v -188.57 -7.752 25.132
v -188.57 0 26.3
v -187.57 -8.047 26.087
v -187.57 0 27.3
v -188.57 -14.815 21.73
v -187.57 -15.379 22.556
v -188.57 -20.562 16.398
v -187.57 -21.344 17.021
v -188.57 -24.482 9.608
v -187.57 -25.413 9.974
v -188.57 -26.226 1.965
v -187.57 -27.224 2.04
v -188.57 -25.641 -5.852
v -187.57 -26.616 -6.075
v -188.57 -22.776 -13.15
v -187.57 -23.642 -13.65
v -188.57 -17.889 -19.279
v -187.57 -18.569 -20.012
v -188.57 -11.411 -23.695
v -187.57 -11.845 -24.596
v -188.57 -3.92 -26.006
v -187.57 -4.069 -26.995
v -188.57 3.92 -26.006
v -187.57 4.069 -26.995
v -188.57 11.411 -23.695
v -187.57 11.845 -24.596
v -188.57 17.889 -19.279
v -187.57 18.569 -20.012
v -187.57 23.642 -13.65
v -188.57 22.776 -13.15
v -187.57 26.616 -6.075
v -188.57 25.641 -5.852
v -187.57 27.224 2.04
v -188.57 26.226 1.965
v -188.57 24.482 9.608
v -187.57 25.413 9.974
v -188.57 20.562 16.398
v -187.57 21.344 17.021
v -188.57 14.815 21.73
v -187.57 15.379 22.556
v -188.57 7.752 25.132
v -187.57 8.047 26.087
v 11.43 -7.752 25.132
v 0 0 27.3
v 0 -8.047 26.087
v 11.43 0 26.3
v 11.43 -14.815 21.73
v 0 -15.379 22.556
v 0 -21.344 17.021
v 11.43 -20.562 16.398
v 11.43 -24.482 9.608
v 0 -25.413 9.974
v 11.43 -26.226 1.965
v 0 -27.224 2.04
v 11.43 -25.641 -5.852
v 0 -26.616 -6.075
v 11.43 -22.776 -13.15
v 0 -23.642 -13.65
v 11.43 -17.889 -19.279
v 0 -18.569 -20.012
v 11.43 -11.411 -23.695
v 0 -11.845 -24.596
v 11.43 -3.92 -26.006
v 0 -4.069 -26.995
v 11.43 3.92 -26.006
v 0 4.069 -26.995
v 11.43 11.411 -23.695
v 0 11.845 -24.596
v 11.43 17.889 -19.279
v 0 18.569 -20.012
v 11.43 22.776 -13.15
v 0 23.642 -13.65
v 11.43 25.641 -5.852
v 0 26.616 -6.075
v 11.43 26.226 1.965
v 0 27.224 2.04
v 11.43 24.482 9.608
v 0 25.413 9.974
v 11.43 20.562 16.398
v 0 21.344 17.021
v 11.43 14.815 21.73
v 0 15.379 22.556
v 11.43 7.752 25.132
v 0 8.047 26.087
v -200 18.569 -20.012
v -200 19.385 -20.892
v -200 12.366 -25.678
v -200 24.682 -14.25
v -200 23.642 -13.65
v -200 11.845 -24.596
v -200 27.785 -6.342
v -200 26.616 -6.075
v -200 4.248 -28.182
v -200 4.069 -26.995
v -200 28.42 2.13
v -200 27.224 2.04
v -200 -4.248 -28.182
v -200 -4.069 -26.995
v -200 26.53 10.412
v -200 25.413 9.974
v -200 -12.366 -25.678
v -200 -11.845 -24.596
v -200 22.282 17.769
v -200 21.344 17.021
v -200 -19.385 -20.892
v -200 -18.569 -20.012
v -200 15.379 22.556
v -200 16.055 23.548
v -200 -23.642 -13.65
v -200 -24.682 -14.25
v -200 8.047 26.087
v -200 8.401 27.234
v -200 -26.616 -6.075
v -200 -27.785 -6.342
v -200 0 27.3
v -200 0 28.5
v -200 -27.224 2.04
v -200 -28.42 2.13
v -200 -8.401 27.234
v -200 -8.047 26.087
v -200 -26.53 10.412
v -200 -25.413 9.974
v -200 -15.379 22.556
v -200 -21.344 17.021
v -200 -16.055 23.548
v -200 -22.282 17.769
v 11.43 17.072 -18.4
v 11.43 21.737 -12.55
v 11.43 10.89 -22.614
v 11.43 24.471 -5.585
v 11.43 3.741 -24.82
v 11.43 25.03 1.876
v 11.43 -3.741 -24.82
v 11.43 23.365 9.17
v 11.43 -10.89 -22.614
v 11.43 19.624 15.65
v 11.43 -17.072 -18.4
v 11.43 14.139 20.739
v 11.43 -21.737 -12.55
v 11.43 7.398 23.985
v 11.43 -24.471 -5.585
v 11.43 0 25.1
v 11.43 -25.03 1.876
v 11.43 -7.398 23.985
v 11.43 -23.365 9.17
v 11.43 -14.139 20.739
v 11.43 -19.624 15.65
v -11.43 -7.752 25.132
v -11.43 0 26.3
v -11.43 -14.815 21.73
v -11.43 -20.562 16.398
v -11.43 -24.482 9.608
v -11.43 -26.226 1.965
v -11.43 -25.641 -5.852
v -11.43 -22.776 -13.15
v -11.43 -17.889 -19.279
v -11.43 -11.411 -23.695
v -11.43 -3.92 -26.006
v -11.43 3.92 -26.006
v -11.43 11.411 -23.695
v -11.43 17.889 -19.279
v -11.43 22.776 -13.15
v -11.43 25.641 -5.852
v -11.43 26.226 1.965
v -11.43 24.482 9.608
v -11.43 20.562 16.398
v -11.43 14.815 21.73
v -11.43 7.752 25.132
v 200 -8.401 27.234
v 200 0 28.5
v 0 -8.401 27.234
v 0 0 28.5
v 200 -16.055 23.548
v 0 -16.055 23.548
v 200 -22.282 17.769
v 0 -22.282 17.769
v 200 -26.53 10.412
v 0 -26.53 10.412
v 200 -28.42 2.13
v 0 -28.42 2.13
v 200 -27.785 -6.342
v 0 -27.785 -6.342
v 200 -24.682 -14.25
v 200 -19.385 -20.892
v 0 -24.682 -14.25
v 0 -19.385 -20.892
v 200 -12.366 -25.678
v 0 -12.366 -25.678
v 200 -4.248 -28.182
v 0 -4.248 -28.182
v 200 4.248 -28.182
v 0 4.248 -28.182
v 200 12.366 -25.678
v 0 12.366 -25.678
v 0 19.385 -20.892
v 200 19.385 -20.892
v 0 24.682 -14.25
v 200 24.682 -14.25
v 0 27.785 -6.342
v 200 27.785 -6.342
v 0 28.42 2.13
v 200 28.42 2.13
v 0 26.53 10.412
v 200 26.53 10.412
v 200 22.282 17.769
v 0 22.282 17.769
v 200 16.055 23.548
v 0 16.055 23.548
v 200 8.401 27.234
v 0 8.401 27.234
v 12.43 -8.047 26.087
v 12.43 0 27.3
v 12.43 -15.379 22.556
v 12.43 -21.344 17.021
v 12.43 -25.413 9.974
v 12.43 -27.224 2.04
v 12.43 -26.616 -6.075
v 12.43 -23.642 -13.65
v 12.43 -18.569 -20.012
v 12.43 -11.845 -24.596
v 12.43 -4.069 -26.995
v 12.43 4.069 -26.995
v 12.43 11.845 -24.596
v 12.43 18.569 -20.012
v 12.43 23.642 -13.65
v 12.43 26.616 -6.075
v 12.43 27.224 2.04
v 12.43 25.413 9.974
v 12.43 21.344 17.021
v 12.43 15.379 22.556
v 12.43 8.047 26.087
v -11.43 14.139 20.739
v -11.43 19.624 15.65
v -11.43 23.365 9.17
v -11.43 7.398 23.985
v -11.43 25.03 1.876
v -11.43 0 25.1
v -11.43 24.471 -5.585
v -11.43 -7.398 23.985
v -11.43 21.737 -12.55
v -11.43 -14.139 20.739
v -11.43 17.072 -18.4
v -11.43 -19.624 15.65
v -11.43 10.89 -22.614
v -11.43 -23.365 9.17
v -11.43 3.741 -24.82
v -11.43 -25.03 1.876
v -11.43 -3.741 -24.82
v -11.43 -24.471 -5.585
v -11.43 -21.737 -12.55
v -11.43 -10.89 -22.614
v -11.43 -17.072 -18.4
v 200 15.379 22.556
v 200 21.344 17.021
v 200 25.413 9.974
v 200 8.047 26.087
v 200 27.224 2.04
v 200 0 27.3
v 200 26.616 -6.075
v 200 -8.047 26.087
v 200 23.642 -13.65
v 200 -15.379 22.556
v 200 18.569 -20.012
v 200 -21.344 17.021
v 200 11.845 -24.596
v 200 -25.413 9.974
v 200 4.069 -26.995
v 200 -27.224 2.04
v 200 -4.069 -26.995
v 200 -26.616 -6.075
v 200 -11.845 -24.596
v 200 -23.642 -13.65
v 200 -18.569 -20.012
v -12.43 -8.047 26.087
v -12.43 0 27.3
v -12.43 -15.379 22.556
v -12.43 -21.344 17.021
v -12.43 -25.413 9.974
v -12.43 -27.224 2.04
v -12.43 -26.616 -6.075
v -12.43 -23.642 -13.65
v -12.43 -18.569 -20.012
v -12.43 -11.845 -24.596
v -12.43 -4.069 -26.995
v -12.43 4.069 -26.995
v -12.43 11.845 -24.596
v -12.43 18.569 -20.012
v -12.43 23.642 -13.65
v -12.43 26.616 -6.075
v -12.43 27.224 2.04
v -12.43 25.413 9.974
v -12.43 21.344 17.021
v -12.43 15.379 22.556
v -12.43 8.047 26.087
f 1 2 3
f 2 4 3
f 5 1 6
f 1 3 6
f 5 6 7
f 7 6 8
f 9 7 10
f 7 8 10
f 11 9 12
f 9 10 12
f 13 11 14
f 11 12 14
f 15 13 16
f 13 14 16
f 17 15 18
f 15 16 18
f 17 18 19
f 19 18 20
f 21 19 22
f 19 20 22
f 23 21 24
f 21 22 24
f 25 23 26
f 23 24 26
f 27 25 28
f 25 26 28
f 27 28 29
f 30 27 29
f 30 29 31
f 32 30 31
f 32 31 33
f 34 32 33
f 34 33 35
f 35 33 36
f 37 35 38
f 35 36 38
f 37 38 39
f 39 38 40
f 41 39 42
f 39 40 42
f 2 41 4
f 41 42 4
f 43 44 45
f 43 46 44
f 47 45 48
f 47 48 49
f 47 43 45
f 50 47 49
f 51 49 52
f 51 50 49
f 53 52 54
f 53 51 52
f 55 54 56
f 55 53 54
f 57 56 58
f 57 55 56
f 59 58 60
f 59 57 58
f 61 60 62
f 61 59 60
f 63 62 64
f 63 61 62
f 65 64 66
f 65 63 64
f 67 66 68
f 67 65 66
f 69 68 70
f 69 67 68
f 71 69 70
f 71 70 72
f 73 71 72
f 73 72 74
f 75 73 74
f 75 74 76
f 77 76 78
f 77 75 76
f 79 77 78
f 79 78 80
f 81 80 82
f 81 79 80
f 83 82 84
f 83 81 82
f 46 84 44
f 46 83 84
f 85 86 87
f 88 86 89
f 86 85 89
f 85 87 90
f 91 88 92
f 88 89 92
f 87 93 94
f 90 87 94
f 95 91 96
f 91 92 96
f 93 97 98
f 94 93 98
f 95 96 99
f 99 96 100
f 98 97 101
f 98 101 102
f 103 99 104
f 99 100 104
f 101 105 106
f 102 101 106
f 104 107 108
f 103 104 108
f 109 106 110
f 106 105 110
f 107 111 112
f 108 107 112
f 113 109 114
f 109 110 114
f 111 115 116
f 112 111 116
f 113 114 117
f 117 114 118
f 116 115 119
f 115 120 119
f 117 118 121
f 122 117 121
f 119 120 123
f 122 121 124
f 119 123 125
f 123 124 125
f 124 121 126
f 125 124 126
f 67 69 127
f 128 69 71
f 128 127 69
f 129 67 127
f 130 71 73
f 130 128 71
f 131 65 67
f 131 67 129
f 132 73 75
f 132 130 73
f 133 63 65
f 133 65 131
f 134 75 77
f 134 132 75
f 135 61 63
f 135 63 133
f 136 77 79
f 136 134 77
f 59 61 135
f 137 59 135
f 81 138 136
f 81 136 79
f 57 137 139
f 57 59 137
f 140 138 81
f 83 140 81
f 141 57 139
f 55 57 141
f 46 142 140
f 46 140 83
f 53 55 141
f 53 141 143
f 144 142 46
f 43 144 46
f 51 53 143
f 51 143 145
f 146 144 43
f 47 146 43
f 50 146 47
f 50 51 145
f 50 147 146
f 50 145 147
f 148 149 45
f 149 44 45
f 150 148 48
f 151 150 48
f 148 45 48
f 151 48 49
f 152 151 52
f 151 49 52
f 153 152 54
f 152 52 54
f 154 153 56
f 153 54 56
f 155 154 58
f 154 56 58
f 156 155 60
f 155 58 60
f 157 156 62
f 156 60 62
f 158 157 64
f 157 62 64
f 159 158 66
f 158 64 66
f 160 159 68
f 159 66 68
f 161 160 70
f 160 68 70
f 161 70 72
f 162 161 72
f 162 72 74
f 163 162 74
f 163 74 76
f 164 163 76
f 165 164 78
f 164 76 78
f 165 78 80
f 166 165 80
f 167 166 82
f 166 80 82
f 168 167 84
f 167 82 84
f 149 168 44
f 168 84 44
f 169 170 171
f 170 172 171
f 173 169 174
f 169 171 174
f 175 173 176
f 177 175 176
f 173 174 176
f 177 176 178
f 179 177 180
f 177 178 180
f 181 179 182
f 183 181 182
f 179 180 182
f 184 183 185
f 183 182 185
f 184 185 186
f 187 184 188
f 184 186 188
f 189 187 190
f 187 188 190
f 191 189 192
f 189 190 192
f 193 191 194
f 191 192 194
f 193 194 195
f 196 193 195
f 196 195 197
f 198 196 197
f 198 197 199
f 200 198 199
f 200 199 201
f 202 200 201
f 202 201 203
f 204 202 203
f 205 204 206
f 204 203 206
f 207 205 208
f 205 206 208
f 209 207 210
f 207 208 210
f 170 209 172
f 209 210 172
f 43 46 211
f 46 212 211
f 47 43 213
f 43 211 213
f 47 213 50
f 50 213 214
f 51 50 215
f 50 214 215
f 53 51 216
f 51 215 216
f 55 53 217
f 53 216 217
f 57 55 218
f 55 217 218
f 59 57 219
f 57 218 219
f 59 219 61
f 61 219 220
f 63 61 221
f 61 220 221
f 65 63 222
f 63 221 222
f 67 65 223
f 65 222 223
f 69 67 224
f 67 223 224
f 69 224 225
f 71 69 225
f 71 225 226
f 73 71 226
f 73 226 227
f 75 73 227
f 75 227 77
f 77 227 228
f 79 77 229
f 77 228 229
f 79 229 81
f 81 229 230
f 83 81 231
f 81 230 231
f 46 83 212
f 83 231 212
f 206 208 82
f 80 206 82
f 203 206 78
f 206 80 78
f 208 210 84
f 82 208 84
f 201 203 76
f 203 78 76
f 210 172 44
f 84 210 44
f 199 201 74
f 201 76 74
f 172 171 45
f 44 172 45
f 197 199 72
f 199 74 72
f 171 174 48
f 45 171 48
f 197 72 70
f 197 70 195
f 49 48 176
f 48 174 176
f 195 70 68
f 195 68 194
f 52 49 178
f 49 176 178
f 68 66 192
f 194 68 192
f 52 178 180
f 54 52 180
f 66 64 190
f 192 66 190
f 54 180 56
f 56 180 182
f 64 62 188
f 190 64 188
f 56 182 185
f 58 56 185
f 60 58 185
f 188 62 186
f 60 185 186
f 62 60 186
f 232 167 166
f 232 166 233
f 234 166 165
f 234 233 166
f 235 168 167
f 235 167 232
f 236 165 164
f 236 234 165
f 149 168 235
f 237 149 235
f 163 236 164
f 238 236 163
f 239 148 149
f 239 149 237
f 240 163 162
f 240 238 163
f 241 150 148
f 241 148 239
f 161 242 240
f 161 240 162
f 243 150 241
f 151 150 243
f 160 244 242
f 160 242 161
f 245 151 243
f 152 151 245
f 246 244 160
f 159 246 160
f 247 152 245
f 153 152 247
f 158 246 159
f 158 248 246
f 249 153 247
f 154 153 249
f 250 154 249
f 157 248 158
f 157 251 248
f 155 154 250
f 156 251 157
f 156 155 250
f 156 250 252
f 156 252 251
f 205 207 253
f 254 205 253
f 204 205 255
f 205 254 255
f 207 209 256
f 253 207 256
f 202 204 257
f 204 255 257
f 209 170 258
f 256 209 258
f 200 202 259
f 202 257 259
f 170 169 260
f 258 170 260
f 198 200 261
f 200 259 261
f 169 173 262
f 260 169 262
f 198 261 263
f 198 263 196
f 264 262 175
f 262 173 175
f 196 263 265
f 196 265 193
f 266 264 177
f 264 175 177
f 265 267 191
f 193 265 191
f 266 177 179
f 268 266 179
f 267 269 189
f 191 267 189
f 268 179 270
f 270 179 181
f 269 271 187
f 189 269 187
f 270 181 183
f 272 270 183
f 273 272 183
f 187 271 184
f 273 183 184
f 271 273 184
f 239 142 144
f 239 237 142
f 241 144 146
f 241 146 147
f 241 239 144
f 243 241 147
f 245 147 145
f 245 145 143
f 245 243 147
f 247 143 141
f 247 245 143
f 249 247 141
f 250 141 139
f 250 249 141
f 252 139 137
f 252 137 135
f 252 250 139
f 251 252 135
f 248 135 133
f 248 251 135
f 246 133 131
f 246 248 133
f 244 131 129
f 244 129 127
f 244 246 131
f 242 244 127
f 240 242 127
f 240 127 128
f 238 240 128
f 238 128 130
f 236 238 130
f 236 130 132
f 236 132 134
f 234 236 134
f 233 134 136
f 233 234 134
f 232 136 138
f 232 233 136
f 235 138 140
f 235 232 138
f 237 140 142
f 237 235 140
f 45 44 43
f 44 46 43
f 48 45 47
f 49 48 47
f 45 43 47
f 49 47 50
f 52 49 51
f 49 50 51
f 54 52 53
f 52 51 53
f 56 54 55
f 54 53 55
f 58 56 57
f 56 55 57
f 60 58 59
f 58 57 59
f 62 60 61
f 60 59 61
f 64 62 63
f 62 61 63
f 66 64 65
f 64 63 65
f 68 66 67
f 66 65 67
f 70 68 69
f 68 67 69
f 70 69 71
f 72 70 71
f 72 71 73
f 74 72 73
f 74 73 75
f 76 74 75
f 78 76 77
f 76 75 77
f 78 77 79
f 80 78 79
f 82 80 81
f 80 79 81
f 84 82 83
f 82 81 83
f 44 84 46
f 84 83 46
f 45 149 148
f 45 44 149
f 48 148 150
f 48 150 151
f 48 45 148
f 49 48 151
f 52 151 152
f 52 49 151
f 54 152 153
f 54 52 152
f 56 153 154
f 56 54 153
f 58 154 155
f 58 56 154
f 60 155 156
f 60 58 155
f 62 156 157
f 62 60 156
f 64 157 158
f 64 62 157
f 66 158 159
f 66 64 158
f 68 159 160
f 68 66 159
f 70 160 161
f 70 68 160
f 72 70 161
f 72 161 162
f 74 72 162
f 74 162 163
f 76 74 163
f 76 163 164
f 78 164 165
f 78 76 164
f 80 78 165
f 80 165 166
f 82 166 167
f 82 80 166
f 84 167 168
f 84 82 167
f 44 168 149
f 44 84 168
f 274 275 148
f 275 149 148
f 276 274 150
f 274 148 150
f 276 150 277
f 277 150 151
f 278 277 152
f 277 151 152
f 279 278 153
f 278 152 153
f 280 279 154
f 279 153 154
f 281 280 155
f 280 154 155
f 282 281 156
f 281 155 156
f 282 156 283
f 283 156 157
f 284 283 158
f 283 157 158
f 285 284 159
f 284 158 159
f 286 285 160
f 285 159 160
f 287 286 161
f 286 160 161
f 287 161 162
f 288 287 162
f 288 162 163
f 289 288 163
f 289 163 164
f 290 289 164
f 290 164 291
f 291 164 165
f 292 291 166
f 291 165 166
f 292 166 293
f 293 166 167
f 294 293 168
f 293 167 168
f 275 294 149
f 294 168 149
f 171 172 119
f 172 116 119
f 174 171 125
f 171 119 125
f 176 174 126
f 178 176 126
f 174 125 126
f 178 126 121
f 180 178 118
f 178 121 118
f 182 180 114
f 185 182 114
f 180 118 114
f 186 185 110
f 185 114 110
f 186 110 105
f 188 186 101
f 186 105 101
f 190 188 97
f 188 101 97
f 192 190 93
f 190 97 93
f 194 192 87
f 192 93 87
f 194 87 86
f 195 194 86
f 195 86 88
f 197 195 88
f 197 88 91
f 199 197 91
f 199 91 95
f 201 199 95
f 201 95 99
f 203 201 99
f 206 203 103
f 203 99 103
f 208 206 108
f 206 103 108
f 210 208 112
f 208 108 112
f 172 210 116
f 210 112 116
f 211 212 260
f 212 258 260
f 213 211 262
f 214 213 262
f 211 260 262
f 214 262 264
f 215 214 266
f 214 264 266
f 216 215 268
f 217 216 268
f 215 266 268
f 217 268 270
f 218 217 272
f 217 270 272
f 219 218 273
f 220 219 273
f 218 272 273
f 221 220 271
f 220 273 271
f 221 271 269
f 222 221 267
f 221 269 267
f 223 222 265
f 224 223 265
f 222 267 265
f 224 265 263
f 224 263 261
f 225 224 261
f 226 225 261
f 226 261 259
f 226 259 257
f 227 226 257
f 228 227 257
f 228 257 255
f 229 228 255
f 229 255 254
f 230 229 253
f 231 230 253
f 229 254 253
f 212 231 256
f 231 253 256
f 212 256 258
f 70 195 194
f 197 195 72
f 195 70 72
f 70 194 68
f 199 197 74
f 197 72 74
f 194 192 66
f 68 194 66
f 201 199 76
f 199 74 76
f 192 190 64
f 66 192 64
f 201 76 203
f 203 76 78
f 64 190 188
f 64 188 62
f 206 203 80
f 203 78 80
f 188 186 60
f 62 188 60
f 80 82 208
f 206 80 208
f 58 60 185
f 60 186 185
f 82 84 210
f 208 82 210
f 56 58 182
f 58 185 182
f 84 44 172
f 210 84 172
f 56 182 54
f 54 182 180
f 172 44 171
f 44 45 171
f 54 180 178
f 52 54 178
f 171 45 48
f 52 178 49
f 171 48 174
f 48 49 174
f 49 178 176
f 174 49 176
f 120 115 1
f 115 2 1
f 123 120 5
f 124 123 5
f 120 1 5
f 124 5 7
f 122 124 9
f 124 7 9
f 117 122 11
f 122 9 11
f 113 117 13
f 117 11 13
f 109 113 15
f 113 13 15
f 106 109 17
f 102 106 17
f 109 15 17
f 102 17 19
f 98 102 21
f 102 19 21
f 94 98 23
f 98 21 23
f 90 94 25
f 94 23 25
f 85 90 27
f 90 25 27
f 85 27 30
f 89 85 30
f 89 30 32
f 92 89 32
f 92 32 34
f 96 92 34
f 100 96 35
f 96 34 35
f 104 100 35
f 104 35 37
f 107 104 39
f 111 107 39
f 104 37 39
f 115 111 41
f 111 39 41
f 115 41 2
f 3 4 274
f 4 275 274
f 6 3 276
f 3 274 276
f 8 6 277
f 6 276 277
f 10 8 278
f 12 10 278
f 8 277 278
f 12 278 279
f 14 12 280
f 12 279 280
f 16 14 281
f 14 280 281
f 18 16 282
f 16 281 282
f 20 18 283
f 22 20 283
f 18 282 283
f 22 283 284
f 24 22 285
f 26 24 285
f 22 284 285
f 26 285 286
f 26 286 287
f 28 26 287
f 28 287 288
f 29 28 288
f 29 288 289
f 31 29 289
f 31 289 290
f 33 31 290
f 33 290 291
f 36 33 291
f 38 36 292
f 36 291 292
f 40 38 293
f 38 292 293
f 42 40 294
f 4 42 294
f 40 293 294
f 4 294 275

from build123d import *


with BuildPart() as part:
    # Sketch2 → Revolve1 (revolve)
    with BuildSketch(Plane(origin=(0, 0, 0), x_dir=(1, 0, 0), z_dir=(0, 1, 0))):
        Polygon((200, 27.3), (200, 28.5), (0, 28.5), (0, 27.3), (11.430052303, 26.3), (12.430052303, 27.3), align=None)
    revolve(axis=Axis((0, 0, 0), (1, 0, 0)))


with BuildPart() as body_2:
    # Sketch2<3> → Revolve2 (revolve)
    with BuildSketch(Plane(origin=(0, 0, 0), x_dir=(1, 0, 0), z_dir=(0, 1, 0))):
        Polygon((0, 27.3), (0, 28.5), (-200, 28.5), (-200, 27.3), (-188.569947697, 26.3), (-187.569947697, 27.3), (-12.430052303, 27.3), (-11.430052303, 26.3), align=None)
    revolve(axis=Axis((0, 0, 0), (1, 0, 0)))


with BuildPart() as body_3:
    # Sketch3 → Revolve3 (revolve)
    with BuildSketch(Plane(origin=(0, 0, 0), x_dir=(1, 0, 0), z_dir=(0, 1, 0))):
        Polygon((-11.430052303, 26.3), (0, 27.3), (11.430052303, 26.3), (11.430052303, 25.1), (-11.430052303, 25.1), align=None)
    revolve(axis=Axis((0, 0, 0), (1, 0, 0)))


solid = Compound([part.part, body_2.part, body_3.part])
